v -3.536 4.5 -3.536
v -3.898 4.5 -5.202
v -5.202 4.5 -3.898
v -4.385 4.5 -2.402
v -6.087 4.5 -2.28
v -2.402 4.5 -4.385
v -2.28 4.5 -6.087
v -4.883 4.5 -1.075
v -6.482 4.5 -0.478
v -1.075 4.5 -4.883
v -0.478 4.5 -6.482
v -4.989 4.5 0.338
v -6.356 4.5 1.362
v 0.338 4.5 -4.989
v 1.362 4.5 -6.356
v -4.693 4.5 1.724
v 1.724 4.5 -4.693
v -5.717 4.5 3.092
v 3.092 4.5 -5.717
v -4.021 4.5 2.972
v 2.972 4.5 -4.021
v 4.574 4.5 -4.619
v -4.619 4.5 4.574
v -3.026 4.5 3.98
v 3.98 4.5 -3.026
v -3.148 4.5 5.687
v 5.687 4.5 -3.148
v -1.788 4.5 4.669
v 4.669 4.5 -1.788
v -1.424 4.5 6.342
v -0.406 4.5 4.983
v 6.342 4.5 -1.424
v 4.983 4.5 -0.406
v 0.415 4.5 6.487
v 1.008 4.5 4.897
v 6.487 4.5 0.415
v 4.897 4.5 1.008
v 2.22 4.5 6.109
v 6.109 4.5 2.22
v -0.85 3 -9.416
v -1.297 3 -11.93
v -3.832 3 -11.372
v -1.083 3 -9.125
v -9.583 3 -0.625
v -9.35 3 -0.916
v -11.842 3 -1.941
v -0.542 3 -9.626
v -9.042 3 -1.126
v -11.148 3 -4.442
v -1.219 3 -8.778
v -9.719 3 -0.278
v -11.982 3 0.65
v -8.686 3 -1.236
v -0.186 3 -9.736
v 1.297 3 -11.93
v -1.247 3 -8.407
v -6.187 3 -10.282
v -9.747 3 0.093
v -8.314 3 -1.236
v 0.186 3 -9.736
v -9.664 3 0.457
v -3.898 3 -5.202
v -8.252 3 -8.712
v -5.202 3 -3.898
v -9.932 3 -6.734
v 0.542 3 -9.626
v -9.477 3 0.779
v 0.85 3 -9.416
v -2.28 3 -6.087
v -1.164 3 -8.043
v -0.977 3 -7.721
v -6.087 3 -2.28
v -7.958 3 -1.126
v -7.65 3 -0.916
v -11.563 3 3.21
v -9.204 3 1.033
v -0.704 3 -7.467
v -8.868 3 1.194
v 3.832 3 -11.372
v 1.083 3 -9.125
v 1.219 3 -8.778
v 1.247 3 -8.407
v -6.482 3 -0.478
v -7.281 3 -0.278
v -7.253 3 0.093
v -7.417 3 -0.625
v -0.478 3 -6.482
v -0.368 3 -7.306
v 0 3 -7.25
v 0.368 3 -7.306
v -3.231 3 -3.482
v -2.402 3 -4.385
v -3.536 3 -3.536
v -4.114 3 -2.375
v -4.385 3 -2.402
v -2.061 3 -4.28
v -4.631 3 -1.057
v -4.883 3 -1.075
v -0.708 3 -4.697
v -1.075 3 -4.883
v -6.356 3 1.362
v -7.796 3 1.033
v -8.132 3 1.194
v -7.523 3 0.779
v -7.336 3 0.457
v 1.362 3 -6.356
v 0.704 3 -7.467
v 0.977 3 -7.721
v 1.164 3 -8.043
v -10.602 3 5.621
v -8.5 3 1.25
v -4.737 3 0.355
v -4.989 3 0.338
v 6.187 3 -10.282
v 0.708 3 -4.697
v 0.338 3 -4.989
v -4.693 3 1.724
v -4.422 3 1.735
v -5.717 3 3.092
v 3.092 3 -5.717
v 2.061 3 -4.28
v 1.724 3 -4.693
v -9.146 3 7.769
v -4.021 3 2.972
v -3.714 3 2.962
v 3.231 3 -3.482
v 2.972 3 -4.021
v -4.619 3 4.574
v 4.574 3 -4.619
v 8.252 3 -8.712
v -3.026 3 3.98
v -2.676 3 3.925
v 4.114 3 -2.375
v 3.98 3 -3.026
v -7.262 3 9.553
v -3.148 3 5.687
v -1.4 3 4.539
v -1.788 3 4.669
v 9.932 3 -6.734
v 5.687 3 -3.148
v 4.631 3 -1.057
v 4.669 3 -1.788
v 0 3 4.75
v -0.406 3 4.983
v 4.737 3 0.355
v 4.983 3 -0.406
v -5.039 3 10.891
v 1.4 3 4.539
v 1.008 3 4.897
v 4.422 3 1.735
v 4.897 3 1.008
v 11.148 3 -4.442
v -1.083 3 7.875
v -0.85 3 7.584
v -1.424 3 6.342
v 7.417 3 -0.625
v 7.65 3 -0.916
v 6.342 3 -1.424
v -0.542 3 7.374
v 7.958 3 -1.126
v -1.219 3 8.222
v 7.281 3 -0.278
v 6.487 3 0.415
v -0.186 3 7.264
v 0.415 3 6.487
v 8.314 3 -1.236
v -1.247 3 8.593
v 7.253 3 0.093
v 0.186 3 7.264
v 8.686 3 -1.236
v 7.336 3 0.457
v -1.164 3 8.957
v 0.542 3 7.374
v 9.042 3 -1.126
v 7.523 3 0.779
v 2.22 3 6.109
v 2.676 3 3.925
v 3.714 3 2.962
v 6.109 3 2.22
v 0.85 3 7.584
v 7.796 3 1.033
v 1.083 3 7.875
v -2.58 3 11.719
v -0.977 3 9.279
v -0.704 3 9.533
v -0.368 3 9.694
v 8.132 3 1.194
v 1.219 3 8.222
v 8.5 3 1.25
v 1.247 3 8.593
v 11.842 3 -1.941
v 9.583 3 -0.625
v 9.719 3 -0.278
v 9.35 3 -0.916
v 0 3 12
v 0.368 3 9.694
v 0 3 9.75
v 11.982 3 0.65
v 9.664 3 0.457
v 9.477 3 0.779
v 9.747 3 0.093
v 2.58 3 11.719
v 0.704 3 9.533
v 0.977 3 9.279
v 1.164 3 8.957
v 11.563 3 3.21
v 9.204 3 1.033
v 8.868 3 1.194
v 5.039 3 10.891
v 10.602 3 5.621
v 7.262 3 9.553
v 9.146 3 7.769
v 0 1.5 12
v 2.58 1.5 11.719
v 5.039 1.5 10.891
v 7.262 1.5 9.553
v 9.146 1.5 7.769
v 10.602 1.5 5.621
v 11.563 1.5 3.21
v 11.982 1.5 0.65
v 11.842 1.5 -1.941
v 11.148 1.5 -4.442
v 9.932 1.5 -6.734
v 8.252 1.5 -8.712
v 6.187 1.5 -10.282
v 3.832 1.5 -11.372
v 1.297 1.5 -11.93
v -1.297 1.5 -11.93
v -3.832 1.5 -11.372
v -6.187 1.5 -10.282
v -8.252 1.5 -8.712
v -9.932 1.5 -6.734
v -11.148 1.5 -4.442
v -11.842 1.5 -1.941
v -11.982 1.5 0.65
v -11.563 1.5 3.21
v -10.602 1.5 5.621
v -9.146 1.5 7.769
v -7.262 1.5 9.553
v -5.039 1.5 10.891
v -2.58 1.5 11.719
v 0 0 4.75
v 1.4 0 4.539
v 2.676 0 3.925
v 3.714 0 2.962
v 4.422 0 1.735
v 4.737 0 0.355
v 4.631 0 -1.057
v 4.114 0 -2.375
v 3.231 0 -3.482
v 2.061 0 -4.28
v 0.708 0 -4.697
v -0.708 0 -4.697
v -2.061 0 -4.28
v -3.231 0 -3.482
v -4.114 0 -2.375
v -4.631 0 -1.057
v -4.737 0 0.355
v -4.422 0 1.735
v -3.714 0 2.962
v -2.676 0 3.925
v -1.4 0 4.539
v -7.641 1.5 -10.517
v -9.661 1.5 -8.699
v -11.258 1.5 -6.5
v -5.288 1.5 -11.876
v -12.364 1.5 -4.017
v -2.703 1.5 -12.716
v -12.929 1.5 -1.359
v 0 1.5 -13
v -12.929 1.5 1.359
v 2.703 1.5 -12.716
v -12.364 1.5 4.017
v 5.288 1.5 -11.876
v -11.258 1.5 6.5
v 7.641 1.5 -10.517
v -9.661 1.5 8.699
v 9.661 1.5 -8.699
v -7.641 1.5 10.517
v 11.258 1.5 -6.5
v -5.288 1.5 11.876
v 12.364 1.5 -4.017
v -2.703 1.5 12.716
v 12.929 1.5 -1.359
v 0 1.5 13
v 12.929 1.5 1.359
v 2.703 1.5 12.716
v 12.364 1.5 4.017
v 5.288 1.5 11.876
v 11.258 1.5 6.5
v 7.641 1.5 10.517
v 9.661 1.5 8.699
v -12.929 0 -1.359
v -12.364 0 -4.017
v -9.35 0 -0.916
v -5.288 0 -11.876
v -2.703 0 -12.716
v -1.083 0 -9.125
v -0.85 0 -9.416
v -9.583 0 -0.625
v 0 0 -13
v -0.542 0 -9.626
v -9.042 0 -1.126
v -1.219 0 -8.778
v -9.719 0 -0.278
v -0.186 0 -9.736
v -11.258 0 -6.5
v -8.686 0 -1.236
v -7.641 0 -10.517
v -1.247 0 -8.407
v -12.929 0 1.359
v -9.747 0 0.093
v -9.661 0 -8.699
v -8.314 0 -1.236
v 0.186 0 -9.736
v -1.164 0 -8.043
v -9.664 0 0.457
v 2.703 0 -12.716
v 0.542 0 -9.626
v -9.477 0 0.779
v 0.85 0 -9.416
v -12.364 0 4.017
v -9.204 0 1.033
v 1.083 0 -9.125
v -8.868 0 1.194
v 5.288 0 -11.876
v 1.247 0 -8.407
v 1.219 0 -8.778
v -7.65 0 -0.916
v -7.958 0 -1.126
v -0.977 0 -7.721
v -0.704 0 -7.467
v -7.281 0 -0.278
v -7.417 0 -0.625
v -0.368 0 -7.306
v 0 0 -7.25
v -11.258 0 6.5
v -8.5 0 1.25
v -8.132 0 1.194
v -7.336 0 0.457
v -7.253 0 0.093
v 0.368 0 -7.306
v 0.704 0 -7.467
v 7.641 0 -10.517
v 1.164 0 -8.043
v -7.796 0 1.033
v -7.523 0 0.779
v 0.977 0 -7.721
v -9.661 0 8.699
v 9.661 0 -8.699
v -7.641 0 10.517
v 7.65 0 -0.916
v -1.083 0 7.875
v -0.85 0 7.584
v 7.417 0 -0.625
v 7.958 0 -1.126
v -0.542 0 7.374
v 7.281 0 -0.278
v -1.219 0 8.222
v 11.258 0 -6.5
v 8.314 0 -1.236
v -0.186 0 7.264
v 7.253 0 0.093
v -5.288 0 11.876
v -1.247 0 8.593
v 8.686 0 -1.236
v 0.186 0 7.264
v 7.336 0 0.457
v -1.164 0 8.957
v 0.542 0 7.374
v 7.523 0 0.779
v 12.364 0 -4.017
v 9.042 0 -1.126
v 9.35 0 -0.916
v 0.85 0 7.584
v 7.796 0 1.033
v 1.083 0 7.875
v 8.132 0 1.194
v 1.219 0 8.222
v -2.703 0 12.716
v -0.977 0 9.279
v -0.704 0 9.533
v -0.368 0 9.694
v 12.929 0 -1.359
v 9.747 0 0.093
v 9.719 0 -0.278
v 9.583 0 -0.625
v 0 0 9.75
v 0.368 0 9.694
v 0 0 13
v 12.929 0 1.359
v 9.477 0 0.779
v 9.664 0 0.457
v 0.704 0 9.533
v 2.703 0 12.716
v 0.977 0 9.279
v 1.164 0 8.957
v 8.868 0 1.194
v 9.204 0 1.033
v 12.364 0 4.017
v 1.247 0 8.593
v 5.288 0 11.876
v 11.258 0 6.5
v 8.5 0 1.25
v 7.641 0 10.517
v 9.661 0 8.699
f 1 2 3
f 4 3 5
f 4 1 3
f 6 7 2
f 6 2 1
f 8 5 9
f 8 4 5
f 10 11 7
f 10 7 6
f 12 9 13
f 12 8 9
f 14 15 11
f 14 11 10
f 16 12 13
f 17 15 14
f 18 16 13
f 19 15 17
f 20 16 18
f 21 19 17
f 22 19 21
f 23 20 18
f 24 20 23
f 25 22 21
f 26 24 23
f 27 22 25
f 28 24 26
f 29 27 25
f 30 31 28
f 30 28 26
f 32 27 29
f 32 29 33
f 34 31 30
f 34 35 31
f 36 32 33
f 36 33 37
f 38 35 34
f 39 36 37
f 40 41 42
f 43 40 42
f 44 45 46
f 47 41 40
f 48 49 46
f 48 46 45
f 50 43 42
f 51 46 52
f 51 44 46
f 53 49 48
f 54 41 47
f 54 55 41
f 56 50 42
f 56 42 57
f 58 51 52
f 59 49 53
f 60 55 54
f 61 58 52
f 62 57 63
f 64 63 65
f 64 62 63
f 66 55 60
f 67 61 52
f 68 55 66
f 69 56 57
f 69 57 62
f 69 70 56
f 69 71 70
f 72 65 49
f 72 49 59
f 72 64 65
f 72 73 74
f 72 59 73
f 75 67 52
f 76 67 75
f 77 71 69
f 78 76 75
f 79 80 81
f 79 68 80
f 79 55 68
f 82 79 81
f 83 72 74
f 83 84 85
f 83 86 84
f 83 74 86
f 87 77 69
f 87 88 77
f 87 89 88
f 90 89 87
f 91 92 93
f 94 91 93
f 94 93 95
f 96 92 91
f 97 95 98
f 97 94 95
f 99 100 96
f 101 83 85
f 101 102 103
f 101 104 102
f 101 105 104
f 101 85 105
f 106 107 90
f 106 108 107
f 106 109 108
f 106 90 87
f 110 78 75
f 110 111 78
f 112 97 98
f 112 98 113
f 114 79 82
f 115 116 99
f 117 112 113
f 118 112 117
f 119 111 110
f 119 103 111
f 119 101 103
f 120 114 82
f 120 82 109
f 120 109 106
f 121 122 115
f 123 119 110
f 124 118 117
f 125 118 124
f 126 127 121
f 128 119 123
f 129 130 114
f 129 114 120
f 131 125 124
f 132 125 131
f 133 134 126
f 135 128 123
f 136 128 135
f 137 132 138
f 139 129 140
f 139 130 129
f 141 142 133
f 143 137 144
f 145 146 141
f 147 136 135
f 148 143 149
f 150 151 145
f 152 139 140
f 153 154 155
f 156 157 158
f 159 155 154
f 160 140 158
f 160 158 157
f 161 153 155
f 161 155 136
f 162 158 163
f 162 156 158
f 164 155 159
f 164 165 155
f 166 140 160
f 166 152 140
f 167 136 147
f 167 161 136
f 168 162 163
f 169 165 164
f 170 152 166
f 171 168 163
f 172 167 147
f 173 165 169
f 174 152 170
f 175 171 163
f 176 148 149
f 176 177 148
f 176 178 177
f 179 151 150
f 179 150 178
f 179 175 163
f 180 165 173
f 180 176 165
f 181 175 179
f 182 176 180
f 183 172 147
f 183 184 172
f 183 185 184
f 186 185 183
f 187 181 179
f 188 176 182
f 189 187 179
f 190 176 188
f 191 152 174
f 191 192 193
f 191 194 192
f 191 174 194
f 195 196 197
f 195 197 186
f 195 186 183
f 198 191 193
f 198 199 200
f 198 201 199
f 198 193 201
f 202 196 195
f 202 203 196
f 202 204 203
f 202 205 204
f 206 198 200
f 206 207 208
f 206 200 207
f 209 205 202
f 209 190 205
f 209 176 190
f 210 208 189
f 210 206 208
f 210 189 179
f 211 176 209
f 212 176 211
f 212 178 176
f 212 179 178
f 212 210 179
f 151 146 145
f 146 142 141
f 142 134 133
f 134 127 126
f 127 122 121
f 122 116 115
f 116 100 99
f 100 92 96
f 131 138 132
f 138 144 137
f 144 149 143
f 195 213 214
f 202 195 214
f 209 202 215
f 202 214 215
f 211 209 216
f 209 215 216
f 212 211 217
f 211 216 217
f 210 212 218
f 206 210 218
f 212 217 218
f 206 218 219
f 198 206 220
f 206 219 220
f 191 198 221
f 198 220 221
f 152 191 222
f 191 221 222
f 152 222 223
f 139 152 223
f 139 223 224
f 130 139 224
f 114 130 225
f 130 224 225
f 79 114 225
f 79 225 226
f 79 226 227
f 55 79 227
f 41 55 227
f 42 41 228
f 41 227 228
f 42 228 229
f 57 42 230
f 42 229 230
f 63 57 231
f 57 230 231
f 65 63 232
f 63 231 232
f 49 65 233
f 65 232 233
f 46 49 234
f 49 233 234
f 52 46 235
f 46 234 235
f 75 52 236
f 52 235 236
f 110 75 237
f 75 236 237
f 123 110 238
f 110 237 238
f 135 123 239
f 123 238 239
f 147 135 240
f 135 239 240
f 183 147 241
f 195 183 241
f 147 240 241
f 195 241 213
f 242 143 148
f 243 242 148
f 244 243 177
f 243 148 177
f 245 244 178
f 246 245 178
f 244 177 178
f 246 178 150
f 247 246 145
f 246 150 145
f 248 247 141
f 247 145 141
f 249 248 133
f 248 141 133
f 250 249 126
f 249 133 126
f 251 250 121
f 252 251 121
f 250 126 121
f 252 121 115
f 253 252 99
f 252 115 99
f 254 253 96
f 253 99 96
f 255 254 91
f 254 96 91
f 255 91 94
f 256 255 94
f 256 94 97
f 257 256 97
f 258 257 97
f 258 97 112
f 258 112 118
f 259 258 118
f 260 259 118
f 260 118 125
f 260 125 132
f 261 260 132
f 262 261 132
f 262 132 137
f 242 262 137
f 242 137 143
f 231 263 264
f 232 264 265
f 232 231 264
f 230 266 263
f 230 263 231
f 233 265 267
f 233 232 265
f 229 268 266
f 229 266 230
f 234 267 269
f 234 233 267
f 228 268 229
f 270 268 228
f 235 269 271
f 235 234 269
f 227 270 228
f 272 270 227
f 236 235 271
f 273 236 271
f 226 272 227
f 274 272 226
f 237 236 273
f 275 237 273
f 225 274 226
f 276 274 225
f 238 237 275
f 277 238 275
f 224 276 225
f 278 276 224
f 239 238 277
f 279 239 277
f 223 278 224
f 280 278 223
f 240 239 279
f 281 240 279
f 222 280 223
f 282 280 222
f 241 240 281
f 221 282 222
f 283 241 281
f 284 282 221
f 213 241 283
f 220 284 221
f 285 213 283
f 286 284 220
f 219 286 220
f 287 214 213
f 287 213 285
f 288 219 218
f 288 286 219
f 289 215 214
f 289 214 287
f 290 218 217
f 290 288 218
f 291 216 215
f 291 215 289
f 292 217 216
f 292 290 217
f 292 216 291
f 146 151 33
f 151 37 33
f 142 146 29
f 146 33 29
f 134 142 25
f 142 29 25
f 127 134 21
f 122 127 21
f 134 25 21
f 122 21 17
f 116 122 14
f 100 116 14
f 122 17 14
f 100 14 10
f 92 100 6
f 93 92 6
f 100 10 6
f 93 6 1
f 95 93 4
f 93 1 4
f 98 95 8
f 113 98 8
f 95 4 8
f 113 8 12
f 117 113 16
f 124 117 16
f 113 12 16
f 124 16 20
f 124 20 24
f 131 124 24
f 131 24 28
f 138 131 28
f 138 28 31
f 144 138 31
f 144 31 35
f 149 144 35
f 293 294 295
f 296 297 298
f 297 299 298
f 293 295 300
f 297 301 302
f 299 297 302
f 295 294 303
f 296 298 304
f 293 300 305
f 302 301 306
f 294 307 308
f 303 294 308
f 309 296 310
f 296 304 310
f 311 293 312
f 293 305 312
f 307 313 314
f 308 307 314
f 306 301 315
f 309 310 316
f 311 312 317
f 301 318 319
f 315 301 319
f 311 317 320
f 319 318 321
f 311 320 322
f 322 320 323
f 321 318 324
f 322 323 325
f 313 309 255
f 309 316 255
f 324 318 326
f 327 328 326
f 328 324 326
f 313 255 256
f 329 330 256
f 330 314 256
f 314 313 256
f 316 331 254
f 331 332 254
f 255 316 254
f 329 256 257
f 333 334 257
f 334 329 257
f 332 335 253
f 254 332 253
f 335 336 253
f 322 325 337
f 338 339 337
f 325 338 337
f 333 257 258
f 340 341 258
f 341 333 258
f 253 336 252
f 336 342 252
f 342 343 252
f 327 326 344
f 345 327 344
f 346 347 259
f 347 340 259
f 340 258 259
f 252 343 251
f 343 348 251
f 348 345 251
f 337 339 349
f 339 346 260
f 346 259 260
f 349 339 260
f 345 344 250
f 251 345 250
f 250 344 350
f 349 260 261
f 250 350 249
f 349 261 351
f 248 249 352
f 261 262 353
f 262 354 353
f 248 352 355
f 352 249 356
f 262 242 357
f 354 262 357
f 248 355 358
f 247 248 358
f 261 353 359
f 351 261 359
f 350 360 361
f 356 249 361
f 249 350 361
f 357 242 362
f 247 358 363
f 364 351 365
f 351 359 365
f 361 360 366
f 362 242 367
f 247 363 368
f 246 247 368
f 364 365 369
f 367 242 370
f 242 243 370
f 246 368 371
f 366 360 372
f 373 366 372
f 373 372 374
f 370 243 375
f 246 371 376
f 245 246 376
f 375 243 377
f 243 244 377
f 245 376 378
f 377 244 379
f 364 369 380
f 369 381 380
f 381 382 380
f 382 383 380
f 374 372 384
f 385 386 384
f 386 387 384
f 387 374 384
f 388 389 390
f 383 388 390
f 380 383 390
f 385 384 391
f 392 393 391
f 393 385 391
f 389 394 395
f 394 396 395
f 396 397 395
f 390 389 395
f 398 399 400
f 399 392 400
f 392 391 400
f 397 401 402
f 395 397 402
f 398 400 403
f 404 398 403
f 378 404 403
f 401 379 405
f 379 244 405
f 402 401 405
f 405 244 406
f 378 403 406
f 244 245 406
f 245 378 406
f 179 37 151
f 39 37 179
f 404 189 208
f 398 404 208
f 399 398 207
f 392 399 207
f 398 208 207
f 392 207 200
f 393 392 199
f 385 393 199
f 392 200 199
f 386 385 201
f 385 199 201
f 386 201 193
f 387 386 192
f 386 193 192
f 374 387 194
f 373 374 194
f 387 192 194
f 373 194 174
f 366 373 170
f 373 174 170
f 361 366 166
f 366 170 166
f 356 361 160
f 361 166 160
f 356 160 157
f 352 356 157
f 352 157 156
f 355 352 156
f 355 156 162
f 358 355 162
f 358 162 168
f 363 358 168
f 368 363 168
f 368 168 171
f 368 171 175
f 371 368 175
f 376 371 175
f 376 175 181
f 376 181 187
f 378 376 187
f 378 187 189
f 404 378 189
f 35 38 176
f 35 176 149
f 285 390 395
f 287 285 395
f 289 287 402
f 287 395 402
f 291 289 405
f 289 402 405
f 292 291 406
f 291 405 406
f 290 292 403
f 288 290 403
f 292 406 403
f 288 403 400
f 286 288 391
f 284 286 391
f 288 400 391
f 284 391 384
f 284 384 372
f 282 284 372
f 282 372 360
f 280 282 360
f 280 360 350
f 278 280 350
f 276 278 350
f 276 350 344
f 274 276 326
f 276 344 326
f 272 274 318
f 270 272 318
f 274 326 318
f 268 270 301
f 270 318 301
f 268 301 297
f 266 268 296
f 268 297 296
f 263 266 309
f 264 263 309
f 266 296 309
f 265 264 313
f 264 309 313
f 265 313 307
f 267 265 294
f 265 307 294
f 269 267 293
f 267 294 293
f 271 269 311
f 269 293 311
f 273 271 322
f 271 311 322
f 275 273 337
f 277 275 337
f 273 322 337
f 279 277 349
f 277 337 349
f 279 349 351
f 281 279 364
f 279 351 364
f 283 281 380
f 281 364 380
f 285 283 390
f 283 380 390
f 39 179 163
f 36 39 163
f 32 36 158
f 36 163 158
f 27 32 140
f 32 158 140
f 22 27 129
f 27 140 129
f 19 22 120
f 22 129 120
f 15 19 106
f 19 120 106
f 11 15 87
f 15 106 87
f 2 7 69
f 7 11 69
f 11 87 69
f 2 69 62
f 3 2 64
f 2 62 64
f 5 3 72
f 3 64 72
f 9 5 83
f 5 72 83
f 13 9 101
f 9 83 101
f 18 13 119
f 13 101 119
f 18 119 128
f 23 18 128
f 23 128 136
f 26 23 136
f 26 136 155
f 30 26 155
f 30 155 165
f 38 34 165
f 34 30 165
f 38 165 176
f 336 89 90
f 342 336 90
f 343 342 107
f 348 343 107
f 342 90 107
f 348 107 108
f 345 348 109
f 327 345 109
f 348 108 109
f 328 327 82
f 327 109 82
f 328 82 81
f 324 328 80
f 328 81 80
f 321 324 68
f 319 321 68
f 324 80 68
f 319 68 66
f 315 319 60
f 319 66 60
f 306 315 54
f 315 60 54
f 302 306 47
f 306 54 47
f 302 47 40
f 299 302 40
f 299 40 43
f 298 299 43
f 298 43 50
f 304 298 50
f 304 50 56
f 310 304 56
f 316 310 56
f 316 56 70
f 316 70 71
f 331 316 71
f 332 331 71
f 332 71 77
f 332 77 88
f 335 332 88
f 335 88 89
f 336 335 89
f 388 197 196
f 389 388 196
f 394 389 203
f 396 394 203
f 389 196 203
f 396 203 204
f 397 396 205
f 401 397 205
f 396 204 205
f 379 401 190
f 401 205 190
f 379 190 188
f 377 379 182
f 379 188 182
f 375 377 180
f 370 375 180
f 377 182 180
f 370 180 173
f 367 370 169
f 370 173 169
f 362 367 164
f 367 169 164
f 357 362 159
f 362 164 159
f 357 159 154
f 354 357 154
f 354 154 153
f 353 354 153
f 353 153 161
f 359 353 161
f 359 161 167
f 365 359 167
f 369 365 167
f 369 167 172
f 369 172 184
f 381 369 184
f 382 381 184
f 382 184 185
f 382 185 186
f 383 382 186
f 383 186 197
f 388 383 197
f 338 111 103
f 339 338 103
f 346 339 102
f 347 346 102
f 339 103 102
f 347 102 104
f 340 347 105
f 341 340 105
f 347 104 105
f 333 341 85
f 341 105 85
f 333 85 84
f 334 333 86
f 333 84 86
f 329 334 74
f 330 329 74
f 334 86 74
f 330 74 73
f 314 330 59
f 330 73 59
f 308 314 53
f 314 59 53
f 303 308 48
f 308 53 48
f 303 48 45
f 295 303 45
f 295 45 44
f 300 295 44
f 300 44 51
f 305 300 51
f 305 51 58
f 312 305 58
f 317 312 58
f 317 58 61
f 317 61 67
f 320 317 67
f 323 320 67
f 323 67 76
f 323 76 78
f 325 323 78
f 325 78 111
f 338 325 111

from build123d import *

# Parameters (mm, degrees)
SKETCH1_R           = 13
BOSS_EXTRUDE1_DEPTH = 1.5
SKETCH2_R           = 12
BOSS_EXTRUDE2_DEPTH = 1.5
SKETCH3_R           = 6.5
BOSS_EXTRUDE3_DEPTH = 1.5
SKETCH4_R           = 1.25
CUT_EXTRUDE1_DEPTH  = 11.5
SKETCH5_R           = 4.75
CUT_EXTRUDE2_DEPTH  = 11.5
SKETCH6_R           = 5
CUT_EXTRUDE3_DEPTH  = 1.5
CUT_EXTRUDE4_DEPTH  = 1.5


with BuildPart() as part:
    # Sketch1 → Boss-Extrude1 (new body)
    with BuildSketch(Plane(origin=(0, 0, 0), x_dir=(1, 0, 0), z_dir=(0, 1, 0))):
        with Locations(Location((0, 0, 0), (0, 0, 270))):
            Circle(SKETCH1_R)
    extrude(amount=BOSS_EXTRUDE1_DEPTH)

    # Sketch2 → Boss-Extrude2 (add)
    with BuildSketch(Plane(origin=(0, 1.5, 0), x_dir=(1, 0, 0), z_dir=(0, 1, 0))):
        with Locations(Location((0, 0, 0), (0, 0, 270))):
            Circle(SKETCH2_R)
    extrude(amount=BOSS_EXTRUDE2_DEPTH)

    # Sketch3 → Boss-Extrude3 (add)
    with BuildSketch(Plane(origin=(0, 3, 0), x_dir=(1, 0, 0), z_dir=(0, 1, 0))):
        with Locations(Location((0, 0, 0), (0, 0, 270))):
            Circle(SKETCH3_R)
    extrude(amount=BOSS_EXTRUDE3_DEPTH)

    # Sketch4 → Cut-Extrude1 (cut)
    with BuildSketch(Plane(origin=(0, 3, 0), x_dir=(1, 0, 0), z_dir=(0, 1, 0))):
        with Locations(Location((-8.5, 0, 0), (0, 0, 270))):
            Circle(SKETCH4_R)
        with Locations(Location((0, 8.5, 0), (0, 0, 270))):
            Circle(SKETCH4_R)
        with Locations(Location((8.5, 0, 0), (0, 0, 270))):
            Circle(SKETCH4_R)
        with Locations(Location((0, -8.5, 0), (0, 0, 270))):
            Circle(SKETCH4_R)
    extrude(amount=-CUT_EXTRUDE1_DEPTH, mode=Mode.SUBTRACT)

    # Sketch5 → Cut-Extrude2 (cut)
    with BuildSketch(Plane(origin=(0, 4.5, 0), x_dir=(1, 0, 0), z_dir=(0, 1, 0))):
        with Locations(Location((0, 0, 0), (0, 0, 270))):
            Circle(SKETCH5_R)
    extrude(amount=-CUT_EXTRUDE2_DEPTH, mode=Mode.SUBTRACT)

    # Sketch6 → Cut-Extrude3 (cut)
    with BuildSketch(Plane(origin=(0, 4.5, 0), x_dir=(1, 0, 0), z_dir=(0, 1, 0))):
        with Locations(Location((0, 0, 0), (0, 0, 270))):
            Circle(SKETCH6_R)
    extrude(amount=-CUT_EXTRUDE3_DEPTH, mode=Mode.SUBTRACT)

    # Sketch7 → Cut-Extrude4 (cut)
    with BuildSketch(Plane(origin=(0, 4.5, 0), x_dir=(1, 0, 0), z_dir=(0, 1, 0))):
        Polygon((0.767606776, -4.656694072), (4.656694072, -0.767606776), (9.347013617, -5.457926321), (5.457926321, -9.347013617), align=None)
    extrude(amount=-CUT_EXTRUDE4_DEPTH, mode=Mode.SUBTRACT)


solid = part.part
